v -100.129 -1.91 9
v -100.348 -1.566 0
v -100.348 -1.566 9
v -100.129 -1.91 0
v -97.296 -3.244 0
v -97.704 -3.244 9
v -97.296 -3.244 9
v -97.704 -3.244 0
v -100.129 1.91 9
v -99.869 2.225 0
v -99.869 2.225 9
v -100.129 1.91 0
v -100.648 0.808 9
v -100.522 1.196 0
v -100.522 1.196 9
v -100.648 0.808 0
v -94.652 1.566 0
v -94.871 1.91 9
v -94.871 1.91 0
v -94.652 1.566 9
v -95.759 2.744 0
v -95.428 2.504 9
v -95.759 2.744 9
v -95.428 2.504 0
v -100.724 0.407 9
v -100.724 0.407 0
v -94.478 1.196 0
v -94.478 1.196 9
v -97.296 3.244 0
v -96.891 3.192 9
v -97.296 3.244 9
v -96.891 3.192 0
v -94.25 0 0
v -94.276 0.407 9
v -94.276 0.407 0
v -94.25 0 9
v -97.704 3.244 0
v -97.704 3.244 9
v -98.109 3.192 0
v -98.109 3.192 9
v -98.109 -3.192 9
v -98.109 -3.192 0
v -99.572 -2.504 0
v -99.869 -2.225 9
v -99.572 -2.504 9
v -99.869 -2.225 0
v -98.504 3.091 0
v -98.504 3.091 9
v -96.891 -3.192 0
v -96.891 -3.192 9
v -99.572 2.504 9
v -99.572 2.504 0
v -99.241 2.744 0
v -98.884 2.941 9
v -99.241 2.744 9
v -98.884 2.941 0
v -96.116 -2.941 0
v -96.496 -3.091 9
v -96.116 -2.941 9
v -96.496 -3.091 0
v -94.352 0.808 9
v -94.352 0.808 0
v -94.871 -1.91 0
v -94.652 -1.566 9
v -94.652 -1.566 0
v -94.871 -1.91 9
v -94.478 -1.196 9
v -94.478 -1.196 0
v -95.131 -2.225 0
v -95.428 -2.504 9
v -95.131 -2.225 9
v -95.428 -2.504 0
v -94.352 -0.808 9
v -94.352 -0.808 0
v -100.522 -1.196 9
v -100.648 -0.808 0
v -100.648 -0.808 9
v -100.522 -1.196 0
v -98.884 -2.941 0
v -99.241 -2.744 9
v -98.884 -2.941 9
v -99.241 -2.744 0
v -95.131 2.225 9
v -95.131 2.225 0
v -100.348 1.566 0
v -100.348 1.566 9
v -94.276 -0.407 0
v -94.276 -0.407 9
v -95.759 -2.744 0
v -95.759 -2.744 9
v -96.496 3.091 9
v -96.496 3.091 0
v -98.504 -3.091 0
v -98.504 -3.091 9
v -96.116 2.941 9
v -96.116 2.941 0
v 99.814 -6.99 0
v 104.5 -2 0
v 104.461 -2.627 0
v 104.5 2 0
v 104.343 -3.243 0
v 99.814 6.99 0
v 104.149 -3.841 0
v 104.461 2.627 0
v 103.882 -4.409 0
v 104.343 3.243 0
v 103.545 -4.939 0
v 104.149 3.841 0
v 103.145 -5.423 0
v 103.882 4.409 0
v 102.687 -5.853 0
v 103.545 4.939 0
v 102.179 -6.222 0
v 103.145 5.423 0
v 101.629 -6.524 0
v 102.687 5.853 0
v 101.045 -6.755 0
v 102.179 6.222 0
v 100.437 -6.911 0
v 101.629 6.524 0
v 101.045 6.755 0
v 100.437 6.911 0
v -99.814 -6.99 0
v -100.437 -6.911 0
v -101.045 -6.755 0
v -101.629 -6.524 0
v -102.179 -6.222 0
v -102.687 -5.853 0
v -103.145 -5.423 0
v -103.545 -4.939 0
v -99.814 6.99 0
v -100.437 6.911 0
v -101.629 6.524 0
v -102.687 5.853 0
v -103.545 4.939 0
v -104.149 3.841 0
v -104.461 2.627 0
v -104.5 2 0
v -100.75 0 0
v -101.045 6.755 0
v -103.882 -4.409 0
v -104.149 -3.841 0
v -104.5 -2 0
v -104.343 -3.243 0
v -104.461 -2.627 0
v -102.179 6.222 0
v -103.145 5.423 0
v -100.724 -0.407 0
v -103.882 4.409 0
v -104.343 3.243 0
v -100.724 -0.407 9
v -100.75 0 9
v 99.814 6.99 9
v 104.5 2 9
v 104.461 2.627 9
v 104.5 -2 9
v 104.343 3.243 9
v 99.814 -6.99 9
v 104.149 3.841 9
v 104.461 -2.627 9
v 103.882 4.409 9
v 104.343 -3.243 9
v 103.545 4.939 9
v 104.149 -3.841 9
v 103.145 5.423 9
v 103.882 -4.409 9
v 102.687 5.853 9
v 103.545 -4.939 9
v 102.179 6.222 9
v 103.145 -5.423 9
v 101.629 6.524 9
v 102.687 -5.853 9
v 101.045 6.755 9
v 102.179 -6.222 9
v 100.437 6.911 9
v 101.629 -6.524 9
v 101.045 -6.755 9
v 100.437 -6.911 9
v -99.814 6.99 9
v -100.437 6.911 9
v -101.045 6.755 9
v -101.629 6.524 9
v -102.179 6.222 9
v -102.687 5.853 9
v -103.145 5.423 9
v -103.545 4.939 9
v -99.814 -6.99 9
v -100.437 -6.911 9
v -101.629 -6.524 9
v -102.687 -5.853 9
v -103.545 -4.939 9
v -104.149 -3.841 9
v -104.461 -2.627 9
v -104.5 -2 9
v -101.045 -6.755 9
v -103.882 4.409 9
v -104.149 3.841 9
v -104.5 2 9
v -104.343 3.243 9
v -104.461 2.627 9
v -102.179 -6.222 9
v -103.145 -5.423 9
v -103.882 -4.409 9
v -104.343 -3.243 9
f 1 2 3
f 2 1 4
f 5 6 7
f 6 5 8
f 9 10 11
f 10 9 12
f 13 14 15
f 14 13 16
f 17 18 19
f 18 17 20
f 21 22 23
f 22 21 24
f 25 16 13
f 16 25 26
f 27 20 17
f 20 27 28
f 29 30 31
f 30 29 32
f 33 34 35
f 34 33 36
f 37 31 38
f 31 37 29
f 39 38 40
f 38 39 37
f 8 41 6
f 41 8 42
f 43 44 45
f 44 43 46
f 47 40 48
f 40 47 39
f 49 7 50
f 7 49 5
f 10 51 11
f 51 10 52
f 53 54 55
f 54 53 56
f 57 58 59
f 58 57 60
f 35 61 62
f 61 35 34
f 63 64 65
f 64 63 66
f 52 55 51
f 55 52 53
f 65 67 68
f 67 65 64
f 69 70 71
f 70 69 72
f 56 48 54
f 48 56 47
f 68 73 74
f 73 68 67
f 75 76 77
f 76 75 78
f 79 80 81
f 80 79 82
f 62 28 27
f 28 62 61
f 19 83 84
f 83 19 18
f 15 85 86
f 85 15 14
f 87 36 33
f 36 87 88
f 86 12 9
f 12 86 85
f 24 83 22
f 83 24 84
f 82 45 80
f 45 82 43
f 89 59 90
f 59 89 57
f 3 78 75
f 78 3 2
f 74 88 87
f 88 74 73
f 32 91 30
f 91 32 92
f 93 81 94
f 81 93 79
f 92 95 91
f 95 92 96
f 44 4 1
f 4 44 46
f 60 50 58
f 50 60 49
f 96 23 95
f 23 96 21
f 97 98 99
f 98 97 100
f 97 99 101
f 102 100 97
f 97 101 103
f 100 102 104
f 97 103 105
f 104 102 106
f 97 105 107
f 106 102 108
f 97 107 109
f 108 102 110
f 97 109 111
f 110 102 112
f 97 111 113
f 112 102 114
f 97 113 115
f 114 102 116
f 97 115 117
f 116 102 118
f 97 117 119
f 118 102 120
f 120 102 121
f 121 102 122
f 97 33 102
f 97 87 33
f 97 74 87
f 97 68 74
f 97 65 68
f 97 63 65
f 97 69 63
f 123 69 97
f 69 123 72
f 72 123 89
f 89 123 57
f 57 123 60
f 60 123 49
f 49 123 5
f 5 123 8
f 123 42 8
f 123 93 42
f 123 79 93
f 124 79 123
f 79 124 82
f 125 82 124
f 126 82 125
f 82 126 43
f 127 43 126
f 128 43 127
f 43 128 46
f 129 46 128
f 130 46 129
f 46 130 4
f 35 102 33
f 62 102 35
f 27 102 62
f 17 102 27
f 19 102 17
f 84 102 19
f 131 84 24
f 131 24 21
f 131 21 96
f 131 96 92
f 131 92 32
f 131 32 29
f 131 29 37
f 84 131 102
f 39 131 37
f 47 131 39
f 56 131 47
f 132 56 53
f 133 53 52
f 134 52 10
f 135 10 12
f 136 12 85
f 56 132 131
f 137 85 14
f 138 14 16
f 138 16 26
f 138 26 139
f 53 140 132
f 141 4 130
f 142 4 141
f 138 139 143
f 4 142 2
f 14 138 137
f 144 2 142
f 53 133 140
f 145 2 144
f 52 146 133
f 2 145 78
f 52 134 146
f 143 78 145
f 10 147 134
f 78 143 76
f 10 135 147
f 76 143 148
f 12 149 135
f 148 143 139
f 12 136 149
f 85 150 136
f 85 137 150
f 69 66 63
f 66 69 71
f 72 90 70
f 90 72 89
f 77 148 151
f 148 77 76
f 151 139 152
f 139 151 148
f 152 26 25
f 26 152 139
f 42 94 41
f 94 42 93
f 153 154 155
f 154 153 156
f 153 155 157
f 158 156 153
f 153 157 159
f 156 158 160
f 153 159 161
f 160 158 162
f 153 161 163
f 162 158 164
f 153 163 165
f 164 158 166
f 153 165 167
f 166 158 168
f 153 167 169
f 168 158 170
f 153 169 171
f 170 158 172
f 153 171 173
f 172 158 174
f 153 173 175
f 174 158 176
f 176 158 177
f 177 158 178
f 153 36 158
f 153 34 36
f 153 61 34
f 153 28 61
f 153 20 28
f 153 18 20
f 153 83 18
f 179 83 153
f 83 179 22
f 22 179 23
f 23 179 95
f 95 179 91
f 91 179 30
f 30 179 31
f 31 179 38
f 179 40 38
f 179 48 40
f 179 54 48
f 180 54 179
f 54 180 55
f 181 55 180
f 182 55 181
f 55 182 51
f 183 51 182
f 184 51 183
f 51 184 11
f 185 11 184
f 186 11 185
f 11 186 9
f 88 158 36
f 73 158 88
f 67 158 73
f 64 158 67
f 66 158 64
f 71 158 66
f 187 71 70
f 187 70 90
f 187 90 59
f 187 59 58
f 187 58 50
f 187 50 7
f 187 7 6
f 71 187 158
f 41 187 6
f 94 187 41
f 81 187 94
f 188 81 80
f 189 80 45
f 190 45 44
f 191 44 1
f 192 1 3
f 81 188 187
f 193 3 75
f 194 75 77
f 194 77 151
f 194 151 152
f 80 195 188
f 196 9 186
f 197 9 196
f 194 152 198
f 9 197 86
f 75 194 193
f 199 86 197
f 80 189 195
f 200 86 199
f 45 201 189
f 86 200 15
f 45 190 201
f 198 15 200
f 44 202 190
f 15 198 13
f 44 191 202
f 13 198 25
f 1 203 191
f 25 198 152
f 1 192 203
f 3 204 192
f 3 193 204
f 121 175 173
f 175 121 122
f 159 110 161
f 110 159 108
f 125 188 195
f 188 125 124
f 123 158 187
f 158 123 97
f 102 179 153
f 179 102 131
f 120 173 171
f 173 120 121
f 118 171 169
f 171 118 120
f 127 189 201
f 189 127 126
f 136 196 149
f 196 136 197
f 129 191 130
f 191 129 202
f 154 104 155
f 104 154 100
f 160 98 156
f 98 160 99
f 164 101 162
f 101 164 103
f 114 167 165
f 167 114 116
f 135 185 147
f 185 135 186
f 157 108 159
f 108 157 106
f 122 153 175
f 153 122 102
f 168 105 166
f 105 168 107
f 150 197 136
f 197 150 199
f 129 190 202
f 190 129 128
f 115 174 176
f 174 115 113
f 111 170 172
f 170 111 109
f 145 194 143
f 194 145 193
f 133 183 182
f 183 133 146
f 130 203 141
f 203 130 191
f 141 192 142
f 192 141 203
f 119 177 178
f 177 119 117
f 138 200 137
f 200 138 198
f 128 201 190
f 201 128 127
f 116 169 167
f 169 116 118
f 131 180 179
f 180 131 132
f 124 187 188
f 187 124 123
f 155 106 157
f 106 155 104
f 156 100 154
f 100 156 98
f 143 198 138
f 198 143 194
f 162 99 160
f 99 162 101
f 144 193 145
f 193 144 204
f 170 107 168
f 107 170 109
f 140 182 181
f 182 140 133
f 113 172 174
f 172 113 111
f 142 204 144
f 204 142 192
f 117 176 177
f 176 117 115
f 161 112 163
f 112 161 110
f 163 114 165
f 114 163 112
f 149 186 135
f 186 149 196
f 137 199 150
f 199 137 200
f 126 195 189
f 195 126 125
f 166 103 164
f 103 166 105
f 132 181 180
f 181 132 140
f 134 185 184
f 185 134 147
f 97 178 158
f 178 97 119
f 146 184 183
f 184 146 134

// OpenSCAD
$fn = 50;


difference() {
	union() {
		hull() {
			translate(v = [-99.5000000000, 2.0000000000, 0]) {
				cylinder(h = 9, r = 5);
			}
			translate(v = [99.5000000000, 2.0000000000, 0]) {
				cylinder(h = 9, r = 5);
			}
			translate(v = [-99.5000000000, -2.0000000000, 0]) {
				cylinder(h = 9, r = 5);
			}
			translate(v = [99.5000000000, -2.0000000000, 0]) {
				cylinder(h = 9, r = 5);
			}
		}
	}
	union() {
		translate(v = [-97.5000000000, 0.0000000000, 0]) {
			cylinder(h = 9, r = 3.2500000000);
		}
		translate(v = [-97.5000000000, 0.0000000000, 0]) {
			cylinder(h = 9, r = 1.8000000000);
		}
		translate(v = [-97.5000000000, 0.0000000000, 0]) {
			cylinder(h = 9, r = 1.8000000000);
		}
		translate(v = [-97.5000000000, 0.0000000000, 0]) {
			cylinder(h = 9, r = 1.8000000000);
		}
	}
}
